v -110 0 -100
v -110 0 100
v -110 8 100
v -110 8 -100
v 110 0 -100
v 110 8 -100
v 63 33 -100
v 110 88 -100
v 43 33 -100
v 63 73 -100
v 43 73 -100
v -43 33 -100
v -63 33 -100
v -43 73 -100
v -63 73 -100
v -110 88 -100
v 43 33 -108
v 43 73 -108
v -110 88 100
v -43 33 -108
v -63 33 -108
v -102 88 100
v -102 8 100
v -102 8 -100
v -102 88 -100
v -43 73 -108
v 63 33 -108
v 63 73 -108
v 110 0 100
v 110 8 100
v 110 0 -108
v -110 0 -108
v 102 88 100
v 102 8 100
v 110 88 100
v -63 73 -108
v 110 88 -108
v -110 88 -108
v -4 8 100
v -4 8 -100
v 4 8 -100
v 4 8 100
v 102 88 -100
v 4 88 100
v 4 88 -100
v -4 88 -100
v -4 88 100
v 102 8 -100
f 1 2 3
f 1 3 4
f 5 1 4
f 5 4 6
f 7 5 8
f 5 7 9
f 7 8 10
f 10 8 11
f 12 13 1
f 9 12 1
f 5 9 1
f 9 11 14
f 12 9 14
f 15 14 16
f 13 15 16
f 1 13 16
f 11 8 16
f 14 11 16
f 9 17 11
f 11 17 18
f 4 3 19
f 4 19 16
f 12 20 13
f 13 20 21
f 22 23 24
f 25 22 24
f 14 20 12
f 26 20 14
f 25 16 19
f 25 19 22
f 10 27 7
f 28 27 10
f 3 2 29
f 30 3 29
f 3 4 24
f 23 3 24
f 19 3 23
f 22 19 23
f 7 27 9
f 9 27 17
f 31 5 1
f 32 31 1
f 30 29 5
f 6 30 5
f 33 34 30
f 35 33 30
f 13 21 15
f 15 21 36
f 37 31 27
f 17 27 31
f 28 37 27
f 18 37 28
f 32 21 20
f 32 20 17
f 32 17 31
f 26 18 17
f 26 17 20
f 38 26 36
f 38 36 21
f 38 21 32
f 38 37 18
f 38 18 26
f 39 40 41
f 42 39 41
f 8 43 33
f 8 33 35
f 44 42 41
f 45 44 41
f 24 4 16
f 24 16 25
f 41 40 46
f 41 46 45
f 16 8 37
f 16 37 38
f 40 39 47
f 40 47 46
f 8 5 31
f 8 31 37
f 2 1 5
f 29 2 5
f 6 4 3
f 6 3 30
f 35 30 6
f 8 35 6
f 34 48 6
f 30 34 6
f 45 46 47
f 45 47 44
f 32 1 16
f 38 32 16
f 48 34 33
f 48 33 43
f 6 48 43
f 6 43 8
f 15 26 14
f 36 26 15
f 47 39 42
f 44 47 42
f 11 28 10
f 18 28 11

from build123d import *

# Parameters (mm, degrees)
SKETCH1_W             = 220
SKETCH1_H             = 200
BOSS_EXTRUDE1_DEPTH   = 8
SKETCH2_W             = 8
SKETCH2_H             = 200
BOSS_EXTRUDE2_DEPTH   = 80
BOSS_EXTRUDE2_2_DEPTH = 80
BOSS_EXTRUDE2_3_DEPTH = 80
SKETCH3_W             = 220
SKETCH3_H             = 88
BOSS_EXTRUDE3_DEPTH   = 8
SKETCH4_W             = 20
SKETCH4_H             = 40
CUT_EXTRUDE1_DEPTH    = 252.213056985


with BuildPart() as part:
    # Sketch1 → Boss-Extrude1 (new body)
    with BuildSketch(Plane(origin=(0, 0, 0), x_dir=(1, 0, 0), z_dir=(0, 1, 0))):
        Rectangle(SKETCH1_W, SKETCH1_H)
    extrude(amount=BOSS_EXTRUDE1_DEPTH)


with BuildPart() as body_2:
    # Sketch2 → Boss-Extrude2 (new body)
    with BuildSketch(Plane(origin=(0, 8, 0), x_dir=(1, 0, 0), z_dir=(0, 1, 0))):
        with Locations((-106, 0)):
            Rectangle(SKETCH2_W, SKETCH2_H)
    extrude(amount=BOSS_EXTRUDE2_DEPTH)


with BuildPart() as body_3:
    # Sketch2 → Boss-Extrude2 2 (new body)
    with BuildSketch(Plane(origin=(0, 8, 0), x_dir=(1, 0, 0), z_dir=(0, 1, 0))):
        with Locations((106, 0)):
            Rectangle(SKETCH2_W, SKETCH2_H)
    extrude(amount=BOSS_EXTRUDE2_2_DEPTH)


with BuildPart() as body_4:
    # Sketch2 → Boss-Extrude2 3 (new body)
    with BuildSketch(Plane(origin=(0, 8, 0), x_dir=(1, 0, 0), z_dir=(0, 1, 0))):
        Rectangle(SKETCH2_W, SKETCH2_H)
    extrude(amount=BOSS_EXTRUDE2_3_DEPTH)


with BuildPart() as body_5:
    # Sketch3 → Boss-Extrude3 (new body)
    with BuildSketch(Plane(origin=(0, 0, -100), x_dir=(-1, 0, 0), z_dir=(0, 0, -1))):
        with Locations((0, 44)):
            Rectangle(SKETCH3_W, SKETCH3_H)
    extrude(amount=BOSS_EXTRUDE3_DEPTH)

    # Sketch4 → Cut-Extrude1 (cut, through all)
    with BuildSketch(Plane(origin=(0, 0, -108), x_dir=(-1, 0, 0), z_dir=(0, 0, -1))):
        with Locations((53, 53)):
            Rectangle(SKETCH4_W, SKETCH4_H)
        with Locations((-53, 53)):
            Rectangle(SKETCH4_W, SKETCH4_H)
    extrude(amount=-CUT_EXTRUDE1_DEPTH, mode=Mode.SUBTRACT)


solid = Compound([part.part, body_2.part, body_3.part, body_4.part, body_5.part])
